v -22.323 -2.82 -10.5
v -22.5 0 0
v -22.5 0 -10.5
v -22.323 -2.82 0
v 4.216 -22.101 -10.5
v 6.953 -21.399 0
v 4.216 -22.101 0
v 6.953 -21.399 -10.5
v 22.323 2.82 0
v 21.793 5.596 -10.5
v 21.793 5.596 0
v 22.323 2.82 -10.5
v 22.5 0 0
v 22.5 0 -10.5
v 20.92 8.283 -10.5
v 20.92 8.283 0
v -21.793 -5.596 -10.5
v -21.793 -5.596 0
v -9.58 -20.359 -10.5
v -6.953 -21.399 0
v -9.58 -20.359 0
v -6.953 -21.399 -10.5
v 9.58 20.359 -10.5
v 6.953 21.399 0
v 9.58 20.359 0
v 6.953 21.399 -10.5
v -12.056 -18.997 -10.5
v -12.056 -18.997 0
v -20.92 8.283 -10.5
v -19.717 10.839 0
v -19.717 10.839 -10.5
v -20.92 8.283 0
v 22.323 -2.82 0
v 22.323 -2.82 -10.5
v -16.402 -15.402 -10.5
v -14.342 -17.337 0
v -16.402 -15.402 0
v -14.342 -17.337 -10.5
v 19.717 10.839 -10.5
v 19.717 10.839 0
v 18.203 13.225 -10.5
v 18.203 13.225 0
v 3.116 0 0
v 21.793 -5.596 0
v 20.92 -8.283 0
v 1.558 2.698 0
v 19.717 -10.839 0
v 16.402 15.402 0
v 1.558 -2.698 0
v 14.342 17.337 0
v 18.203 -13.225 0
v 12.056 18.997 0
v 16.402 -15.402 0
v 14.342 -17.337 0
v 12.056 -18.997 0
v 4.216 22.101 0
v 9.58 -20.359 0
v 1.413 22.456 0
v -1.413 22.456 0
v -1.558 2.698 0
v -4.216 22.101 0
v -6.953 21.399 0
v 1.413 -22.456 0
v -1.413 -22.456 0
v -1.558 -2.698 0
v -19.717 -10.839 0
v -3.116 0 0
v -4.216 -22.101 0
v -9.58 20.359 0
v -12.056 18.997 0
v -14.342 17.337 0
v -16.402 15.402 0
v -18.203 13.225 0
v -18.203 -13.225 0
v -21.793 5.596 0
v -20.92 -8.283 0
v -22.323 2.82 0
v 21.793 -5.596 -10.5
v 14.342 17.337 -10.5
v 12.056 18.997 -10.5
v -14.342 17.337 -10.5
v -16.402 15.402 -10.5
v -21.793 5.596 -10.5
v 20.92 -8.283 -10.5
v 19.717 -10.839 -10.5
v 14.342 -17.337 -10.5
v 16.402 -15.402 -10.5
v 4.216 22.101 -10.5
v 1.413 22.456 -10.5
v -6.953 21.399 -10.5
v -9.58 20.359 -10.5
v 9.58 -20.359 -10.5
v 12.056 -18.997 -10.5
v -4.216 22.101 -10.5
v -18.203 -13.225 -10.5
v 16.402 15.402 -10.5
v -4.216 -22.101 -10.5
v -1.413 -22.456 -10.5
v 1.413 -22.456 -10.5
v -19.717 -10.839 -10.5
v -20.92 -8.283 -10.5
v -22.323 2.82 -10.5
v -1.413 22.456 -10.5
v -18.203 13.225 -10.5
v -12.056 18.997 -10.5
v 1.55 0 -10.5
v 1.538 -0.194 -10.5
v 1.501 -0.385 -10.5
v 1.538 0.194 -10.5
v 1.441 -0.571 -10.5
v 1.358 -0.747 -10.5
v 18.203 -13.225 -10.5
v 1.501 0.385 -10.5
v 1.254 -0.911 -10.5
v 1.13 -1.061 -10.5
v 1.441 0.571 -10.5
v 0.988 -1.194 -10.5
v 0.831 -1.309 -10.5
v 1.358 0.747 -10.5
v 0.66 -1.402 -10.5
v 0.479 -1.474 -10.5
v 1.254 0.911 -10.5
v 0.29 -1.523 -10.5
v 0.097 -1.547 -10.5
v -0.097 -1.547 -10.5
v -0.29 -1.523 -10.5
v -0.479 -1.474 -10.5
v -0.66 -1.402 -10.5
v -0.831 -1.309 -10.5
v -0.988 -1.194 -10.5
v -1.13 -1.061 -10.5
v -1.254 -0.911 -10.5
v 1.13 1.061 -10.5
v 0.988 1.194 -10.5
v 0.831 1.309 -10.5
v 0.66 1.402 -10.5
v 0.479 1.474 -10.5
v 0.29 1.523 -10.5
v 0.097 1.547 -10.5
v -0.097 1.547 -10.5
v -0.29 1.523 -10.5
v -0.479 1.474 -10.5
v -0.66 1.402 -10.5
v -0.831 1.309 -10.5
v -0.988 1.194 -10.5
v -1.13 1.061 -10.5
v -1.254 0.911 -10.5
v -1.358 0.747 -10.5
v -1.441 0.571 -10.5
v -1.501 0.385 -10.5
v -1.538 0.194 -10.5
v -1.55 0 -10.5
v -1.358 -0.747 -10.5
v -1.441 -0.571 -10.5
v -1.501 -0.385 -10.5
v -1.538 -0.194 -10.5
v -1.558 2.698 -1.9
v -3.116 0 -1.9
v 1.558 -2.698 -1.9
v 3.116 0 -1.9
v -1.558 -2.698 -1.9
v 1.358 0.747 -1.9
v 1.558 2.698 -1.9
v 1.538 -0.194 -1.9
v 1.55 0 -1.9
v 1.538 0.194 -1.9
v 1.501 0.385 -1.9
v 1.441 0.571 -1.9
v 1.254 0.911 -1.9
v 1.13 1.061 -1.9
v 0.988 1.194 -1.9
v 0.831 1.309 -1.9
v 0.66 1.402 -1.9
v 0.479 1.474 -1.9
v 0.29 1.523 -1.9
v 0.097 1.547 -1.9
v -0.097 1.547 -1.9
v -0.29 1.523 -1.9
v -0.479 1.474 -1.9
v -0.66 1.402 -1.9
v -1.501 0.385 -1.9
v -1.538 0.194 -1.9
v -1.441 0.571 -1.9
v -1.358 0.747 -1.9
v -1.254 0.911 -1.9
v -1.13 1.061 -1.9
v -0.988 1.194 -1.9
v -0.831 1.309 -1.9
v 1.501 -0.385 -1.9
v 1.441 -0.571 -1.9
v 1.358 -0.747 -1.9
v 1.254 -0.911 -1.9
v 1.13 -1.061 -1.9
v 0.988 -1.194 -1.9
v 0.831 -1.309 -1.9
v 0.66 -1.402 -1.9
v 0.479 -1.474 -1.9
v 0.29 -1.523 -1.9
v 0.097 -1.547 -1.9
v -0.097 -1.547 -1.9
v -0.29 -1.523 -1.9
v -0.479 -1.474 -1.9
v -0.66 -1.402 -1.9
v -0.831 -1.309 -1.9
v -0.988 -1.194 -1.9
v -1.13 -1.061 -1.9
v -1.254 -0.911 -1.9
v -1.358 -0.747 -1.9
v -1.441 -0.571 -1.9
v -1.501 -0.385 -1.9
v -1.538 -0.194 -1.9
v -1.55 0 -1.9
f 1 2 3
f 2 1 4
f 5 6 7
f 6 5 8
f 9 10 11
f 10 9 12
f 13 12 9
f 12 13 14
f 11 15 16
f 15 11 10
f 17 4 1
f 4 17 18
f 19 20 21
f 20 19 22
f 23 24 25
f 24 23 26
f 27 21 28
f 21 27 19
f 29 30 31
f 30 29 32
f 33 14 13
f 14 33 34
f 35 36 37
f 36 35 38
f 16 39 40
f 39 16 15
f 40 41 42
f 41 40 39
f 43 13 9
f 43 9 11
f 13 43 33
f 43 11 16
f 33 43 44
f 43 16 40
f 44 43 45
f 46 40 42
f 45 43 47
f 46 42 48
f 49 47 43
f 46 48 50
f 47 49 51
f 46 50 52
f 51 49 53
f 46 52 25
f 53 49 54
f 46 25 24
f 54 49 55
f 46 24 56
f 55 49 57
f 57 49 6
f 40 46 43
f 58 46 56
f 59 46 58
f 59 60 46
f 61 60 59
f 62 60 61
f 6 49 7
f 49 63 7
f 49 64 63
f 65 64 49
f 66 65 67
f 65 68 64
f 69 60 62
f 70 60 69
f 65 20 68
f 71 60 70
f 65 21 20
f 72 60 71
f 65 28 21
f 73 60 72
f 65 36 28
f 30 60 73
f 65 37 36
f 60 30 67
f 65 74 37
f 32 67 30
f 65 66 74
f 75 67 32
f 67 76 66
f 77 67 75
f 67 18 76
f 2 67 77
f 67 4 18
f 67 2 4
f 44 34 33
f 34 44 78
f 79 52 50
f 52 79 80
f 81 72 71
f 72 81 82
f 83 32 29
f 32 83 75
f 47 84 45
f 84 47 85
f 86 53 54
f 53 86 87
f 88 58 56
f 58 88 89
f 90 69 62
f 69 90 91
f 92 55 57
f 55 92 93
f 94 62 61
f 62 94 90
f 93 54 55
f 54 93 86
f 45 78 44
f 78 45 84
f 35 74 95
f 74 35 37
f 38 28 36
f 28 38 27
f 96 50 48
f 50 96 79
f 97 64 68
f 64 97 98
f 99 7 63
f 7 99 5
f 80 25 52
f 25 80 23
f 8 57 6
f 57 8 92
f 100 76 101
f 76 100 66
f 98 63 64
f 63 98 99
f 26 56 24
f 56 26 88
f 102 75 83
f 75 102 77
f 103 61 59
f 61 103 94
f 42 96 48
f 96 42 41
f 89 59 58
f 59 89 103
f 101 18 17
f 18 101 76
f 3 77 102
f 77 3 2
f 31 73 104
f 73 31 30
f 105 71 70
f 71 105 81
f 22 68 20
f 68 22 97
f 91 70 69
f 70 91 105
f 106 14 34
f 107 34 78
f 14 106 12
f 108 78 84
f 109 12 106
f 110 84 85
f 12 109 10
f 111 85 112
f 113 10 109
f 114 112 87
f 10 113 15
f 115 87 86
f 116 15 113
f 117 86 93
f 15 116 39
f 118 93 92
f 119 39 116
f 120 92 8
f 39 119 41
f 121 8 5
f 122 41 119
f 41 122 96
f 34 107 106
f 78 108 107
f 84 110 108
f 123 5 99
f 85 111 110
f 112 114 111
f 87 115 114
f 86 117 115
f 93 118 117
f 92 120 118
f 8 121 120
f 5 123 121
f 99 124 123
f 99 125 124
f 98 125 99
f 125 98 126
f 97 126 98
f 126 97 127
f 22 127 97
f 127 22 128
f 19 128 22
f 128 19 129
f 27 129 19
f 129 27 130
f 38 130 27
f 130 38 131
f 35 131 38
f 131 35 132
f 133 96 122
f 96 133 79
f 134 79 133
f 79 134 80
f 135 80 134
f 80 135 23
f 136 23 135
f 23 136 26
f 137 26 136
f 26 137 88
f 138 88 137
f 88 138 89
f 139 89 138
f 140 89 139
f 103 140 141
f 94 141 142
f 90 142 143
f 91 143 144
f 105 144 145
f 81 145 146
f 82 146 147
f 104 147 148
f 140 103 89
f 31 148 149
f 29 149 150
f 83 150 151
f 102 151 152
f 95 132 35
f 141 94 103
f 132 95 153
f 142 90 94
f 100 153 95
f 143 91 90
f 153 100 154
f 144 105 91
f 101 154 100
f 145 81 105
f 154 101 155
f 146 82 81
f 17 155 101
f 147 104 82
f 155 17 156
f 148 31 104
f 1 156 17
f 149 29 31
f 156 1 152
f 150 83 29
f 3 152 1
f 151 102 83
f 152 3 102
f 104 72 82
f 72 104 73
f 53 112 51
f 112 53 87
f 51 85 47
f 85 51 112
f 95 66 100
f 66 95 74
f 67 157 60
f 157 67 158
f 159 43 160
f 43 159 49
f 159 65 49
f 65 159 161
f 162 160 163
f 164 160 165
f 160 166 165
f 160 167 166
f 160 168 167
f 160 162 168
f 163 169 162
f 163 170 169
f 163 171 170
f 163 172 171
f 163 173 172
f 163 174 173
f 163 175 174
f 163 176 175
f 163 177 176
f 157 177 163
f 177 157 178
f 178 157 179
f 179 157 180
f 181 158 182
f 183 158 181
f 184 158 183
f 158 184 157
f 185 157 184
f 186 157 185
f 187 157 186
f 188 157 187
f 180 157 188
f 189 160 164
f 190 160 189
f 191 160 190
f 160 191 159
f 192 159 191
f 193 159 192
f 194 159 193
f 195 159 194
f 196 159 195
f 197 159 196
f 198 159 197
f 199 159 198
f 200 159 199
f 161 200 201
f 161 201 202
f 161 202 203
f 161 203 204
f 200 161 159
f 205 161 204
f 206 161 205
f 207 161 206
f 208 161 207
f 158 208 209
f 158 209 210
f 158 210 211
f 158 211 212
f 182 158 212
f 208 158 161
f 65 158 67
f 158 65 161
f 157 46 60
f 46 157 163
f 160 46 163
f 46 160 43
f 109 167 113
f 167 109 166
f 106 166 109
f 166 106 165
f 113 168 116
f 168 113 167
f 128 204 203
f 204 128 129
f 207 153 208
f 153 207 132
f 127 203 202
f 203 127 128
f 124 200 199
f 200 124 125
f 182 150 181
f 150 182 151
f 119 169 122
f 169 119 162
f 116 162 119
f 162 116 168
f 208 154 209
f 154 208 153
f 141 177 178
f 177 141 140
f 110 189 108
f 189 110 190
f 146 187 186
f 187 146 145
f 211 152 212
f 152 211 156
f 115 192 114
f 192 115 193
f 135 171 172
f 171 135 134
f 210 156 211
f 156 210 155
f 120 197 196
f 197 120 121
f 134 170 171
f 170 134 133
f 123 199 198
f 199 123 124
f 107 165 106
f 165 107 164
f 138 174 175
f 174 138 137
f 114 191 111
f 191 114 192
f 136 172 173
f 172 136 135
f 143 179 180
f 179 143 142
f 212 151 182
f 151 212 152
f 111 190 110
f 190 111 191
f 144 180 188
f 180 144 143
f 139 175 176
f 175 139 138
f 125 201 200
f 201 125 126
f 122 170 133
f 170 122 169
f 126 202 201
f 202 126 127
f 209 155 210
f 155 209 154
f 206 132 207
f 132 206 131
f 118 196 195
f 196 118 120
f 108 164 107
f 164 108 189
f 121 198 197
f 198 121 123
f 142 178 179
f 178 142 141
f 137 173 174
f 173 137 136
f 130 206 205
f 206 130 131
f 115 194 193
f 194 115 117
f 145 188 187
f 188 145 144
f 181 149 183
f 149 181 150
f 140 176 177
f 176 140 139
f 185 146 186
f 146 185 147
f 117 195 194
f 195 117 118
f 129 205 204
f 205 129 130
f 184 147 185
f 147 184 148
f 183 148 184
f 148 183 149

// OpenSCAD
$fn = 50;


difference() {
	union() {
		translate(v = [0, 0, -10.5000000000]) {
			cylinder(h = 10.5000000000, r = 22.5000000000);
		}
		translate(v = [0, 0, -9.0000000000]) {
			cylinder(h = 9, r = 2.8750000000);
		}
	}
	union() {
		translate(v = [0, 0, 0]) {
			rotate(a = [0, 0, 0]) {
				difference() {
					union() {
						translate(v = [0, 0, -1.9000000000]) {
							linear_extrude(height = 1.9000000000) {
								polygon(points = [[3.1158000000, 0.0000000000], [1.5579000000, 2.6983619531], [-1.5579000000, 2.6983619531], [-3.1158000000, 0.0000000000], [-1.5579000000, -2.6983619531], [1.5579000000, -2.6983619531]]);
							}
						}
					}
					union();
				}
			}
		}
		#translate(v = [0, 0, -100.0000000000]) {
			cylinder(h = 200, r = 1.5500000000);
		}
	}
}
